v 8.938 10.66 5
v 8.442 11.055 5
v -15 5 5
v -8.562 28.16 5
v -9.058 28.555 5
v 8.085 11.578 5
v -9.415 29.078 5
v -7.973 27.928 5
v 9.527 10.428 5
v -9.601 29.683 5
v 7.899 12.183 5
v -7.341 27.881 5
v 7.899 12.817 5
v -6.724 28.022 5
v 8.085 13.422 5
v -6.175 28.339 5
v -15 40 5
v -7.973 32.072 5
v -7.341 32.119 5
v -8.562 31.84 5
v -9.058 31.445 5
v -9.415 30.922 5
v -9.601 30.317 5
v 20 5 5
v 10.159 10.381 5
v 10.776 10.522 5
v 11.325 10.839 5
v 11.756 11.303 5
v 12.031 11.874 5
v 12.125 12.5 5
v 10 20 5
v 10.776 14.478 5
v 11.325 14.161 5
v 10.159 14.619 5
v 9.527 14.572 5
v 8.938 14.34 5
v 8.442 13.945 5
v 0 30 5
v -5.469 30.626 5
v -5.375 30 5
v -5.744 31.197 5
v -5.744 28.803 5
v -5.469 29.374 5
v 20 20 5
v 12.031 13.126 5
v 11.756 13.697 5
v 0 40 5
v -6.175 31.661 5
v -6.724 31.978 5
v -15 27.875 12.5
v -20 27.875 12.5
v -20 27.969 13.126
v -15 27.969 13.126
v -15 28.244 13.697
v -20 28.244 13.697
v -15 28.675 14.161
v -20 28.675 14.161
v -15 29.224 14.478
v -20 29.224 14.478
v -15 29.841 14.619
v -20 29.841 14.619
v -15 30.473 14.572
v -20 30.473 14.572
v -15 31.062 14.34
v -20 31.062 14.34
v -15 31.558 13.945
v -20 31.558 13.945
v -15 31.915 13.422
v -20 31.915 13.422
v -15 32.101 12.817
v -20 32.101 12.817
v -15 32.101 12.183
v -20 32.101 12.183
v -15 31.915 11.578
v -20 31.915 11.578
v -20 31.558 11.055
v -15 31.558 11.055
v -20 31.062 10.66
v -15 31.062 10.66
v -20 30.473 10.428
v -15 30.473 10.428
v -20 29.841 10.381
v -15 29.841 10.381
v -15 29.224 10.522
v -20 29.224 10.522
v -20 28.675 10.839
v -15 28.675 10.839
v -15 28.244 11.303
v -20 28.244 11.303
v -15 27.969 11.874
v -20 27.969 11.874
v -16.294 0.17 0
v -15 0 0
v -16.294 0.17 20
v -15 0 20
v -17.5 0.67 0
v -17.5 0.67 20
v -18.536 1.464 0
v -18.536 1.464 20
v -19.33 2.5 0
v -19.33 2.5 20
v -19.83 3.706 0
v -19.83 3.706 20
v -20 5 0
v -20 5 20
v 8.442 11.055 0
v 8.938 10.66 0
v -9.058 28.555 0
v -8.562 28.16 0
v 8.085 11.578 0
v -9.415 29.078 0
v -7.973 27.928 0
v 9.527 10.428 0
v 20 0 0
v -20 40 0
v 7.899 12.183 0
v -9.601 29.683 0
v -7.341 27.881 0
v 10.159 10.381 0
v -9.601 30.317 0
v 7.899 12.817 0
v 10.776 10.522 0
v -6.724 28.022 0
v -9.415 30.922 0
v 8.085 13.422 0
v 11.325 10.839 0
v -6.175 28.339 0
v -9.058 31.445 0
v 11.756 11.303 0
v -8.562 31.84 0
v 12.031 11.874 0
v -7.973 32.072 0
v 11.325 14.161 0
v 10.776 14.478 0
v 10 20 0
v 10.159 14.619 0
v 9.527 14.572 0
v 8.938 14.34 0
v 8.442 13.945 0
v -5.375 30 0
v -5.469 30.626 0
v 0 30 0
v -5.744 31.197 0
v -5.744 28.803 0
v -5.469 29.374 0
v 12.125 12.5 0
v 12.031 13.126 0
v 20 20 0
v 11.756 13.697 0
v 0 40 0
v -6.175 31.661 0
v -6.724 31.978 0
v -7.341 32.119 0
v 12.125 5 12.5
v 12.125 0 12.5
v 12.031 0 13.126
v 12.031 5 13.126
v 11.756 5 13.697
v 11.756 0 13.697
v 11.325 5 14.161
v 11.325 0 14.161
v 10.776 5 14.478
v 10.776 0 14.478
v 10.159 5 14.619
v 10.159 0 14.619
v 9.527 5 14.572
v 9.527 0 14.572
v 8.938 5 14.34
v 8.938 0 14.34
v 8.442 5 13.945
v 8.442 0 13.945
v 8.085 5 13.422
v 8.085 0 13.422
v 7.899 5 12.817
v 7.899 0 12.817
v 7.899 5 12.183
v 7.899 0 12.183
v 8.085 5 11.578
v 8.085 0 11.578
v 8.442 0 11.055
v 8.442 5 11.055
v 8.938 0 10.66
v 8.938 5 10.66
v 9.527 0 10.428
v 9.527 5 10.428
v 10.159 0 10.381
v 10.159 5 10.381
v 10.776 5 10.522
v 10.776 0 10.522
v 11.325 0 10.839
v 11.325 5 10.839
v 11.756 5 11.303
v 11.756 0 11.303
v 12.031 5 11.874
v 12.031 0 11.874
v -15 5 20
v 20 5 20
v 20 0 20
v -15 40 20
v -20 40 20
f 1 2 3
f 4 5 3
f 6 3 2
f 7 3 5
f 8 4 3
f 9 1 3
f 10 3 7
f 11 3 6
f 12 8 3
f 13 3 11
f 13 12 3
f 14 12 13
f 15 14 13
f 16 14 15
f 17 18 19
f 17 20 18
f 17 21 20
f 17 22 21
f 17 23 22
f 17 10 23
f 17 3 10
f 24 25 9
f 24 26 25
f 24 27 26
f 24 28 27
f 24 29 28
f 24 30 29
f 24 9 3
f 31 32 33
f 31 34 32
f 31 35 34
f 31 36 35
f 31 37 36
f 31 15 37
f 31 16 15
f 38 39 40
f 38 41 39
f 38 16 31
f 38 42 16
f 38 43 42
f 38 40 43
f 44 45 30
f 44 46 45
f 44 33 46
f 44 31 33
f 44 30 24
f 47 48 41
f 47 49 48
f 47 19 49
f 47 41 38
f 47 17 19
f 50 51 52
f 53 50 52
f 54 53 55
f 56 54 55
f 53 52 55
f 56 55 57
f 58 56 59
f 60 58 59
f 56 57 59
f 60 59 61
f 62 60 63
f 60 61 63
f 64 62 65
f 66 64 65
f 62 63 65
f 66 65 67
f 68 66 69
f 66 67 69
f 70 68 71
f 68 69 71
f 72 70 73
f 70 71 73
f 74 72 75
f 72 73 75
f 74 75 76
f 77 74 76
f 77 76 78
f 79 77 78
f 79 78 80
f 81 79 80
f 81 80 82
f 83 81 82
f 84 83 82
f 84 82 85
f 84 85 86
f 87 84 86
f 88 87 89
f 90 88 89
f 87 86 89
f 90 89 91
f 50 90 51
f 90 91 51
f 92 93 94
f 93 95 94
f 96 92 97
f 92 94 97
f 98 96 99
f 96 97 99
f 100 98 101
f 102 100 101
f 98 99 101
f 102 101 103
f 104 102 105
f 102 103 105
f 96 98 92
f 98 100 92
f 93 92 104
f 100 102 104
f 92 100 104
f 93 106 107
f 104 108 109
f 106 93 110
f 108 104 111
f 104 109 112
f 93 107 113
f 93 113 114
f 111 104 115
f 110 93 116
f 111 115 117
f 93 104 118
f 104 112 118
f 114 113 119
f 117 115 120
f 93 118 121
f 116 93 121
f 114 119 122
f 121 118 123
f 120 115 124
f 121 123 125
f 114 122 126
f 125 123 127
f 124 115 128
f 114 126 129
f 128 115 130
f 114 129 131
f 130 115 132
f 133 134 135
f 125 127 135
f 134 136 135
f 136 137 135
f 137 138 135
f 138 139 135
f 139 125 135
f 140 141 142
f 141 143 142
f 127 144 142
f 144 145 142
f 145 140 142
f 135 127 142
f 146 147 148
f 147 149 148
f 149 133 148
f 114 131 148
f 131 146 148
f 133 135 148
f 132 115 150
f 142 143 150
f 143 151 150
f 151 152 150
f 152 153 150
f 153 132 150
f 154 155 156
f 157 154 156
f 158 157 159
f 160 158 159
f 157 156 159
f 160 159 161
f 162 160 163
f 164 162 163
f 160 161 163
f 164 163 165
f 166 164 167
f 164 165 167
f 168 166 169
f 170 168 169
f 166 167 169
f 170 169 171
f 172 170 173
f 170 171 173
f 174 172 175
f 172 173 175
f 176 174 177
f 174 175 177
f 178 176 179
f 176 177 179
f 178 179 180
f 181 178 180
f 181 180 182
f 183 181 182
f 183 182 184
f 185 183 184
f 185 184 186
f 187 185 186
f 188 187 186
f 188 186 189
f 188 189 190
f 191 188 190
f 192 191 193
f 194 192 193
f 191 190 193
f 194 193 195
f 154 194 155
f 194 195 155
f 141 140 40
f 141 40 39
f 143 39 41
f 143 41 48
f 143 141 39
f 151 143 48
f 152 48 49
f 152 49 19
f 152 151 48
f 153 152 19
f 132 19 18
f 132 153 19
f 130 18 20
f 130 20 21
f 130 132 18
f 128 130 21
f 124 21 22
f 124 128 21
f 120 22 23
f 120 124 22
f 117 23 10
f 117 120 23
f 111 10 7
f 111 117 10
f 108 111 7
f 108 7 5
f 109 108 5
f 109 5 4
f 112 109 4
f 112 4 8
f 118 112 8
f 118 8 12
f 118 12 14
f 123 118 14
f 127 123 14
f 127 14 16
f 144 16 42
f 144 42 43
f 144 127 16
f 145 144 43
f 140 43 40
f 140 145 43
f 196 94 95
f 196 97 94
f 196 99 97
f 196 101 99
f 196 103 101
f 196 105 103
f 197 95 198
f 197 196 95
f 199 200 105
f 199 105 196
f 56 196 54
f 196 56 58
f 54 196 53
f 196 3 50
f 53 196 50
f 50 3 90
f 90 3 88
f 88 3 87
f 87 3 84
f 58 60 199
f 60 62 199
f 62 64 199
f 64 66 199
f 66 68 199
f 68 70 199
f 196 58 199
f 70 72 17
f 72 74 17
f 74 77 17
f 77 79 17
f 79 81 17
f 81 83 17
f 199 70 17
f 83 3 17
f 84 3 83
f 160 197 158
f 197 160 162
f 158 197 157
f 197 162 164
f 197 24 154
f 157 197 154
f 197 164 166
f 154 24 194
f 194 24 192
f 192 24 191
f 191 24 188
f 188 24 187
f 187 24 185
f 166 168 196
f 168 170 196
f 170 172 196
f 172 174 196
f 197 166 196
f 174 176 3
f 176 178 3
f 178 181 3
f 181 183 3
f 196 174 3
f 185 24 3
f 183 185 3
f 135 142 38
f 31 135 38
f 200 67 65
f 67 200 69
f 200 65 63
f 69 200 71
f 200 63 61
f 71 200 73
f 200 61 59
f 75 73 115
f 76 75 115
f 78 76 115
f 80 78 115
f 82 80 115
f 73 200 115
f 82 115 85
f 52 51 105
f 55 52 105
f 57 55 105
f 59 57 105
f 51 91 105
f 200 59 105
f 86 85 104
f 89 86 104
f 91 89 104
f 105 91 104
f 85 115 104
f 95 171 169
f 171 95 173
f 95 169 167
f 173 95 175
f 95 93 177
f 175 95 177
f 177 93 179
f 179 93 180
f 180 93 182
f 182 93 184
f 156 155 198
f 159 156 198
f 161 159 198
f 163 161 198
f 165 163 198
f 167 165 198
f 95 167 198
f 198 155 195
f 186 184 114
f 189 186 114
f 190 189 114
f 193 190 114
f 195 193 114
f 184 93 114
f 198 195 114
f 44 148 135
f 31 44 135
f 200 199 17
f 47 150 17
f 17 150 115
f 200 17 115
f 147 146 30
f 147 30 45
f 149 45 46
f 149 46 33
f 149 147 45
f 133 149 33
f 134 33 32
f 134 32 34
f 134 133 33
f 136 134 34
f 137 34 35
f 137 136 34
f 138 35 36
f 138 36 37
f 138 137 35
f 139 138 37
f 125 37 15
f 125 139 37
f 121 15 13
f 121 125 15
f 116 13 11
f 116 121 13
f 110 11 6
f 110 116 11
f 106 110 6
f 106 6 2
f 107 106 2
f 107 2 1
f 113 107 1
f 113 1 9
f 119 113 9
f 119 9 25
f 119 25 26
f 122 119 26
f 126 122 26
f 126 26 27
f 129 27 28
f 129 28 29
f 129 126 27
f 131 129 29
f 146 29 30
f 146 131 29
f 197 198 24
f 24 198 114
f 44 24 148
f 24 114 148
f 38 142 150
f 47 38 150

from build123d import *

# Parameters (mm, degrees)
F0_R     = 2.125
F1_DEPTH = 5
F3_DEPTH = 15
F4_SIZE  = 10
F5_R     = 2.125
F6_DEPTH = 5
F7_R     = 2.125
F8_DEPTH = 5
F9_R     = 5


with BuildPart() as f1:
    # F0 (on Top) → F1 (new body)
    with BuildSketch(Plane.XY):
        Polygon((0, 20), (0, 40), (-20, 40), (-20, 0), (20, 0), (20, 20), align=None)
        with Locations((10, 12.5)):
            Circle(F0_R, mode=Mode.SUBTRACT)
        with Locations((-7.5, 30)):
            Circle(F0_R, mode=Mode.SUBTRACT)
    extrude(amount=F1_DEPTH)

    # F2 (on face) → F3 (join)
    with BuildSketch(Plane.XY.offset(5)):
        Polygon((-15, 40), (-20, 40), (-20, 0), (20, 0), (20, 5), (-15, 5), align=None)
    extrude(amount=F3_DEPTH)

    # F4
    f4_edges = [f1.edges().sort_by_distance(p)[0] for p in [
        (0, 20, 2.5),
    ]]
    chamfer(f4_edges, length=F4_SIZE)

    # F5 (on face) → F6 (cut)
    with BuildSketch(Plane.XZ):
        with Locations((10, 12.5)):
            Circle(F5_R)
    extrude(amount=-F6_DEPTH, mode=Mode.SUBTRACT)

    # F7 (on face) → F8 (cut)
    with BuildSketch(Plane(origin=(-20, 0, 0), x_dir=(0, -1, 0), z_dir=(-1, 0, 0))):
        with Locations((-30, 12.5)):
            Circle(F7_R)
    extrude(amount=-F8_DEPTH, mode=Mode.SUBTRACT)

    # F9
    f9_edges = [f1.edges().sort_by_distance(p)[0] for p in [
        (-20, 0, 10),
    ]]
    fillet(f9_edges, radius=F9_R)


solid = f1.part
